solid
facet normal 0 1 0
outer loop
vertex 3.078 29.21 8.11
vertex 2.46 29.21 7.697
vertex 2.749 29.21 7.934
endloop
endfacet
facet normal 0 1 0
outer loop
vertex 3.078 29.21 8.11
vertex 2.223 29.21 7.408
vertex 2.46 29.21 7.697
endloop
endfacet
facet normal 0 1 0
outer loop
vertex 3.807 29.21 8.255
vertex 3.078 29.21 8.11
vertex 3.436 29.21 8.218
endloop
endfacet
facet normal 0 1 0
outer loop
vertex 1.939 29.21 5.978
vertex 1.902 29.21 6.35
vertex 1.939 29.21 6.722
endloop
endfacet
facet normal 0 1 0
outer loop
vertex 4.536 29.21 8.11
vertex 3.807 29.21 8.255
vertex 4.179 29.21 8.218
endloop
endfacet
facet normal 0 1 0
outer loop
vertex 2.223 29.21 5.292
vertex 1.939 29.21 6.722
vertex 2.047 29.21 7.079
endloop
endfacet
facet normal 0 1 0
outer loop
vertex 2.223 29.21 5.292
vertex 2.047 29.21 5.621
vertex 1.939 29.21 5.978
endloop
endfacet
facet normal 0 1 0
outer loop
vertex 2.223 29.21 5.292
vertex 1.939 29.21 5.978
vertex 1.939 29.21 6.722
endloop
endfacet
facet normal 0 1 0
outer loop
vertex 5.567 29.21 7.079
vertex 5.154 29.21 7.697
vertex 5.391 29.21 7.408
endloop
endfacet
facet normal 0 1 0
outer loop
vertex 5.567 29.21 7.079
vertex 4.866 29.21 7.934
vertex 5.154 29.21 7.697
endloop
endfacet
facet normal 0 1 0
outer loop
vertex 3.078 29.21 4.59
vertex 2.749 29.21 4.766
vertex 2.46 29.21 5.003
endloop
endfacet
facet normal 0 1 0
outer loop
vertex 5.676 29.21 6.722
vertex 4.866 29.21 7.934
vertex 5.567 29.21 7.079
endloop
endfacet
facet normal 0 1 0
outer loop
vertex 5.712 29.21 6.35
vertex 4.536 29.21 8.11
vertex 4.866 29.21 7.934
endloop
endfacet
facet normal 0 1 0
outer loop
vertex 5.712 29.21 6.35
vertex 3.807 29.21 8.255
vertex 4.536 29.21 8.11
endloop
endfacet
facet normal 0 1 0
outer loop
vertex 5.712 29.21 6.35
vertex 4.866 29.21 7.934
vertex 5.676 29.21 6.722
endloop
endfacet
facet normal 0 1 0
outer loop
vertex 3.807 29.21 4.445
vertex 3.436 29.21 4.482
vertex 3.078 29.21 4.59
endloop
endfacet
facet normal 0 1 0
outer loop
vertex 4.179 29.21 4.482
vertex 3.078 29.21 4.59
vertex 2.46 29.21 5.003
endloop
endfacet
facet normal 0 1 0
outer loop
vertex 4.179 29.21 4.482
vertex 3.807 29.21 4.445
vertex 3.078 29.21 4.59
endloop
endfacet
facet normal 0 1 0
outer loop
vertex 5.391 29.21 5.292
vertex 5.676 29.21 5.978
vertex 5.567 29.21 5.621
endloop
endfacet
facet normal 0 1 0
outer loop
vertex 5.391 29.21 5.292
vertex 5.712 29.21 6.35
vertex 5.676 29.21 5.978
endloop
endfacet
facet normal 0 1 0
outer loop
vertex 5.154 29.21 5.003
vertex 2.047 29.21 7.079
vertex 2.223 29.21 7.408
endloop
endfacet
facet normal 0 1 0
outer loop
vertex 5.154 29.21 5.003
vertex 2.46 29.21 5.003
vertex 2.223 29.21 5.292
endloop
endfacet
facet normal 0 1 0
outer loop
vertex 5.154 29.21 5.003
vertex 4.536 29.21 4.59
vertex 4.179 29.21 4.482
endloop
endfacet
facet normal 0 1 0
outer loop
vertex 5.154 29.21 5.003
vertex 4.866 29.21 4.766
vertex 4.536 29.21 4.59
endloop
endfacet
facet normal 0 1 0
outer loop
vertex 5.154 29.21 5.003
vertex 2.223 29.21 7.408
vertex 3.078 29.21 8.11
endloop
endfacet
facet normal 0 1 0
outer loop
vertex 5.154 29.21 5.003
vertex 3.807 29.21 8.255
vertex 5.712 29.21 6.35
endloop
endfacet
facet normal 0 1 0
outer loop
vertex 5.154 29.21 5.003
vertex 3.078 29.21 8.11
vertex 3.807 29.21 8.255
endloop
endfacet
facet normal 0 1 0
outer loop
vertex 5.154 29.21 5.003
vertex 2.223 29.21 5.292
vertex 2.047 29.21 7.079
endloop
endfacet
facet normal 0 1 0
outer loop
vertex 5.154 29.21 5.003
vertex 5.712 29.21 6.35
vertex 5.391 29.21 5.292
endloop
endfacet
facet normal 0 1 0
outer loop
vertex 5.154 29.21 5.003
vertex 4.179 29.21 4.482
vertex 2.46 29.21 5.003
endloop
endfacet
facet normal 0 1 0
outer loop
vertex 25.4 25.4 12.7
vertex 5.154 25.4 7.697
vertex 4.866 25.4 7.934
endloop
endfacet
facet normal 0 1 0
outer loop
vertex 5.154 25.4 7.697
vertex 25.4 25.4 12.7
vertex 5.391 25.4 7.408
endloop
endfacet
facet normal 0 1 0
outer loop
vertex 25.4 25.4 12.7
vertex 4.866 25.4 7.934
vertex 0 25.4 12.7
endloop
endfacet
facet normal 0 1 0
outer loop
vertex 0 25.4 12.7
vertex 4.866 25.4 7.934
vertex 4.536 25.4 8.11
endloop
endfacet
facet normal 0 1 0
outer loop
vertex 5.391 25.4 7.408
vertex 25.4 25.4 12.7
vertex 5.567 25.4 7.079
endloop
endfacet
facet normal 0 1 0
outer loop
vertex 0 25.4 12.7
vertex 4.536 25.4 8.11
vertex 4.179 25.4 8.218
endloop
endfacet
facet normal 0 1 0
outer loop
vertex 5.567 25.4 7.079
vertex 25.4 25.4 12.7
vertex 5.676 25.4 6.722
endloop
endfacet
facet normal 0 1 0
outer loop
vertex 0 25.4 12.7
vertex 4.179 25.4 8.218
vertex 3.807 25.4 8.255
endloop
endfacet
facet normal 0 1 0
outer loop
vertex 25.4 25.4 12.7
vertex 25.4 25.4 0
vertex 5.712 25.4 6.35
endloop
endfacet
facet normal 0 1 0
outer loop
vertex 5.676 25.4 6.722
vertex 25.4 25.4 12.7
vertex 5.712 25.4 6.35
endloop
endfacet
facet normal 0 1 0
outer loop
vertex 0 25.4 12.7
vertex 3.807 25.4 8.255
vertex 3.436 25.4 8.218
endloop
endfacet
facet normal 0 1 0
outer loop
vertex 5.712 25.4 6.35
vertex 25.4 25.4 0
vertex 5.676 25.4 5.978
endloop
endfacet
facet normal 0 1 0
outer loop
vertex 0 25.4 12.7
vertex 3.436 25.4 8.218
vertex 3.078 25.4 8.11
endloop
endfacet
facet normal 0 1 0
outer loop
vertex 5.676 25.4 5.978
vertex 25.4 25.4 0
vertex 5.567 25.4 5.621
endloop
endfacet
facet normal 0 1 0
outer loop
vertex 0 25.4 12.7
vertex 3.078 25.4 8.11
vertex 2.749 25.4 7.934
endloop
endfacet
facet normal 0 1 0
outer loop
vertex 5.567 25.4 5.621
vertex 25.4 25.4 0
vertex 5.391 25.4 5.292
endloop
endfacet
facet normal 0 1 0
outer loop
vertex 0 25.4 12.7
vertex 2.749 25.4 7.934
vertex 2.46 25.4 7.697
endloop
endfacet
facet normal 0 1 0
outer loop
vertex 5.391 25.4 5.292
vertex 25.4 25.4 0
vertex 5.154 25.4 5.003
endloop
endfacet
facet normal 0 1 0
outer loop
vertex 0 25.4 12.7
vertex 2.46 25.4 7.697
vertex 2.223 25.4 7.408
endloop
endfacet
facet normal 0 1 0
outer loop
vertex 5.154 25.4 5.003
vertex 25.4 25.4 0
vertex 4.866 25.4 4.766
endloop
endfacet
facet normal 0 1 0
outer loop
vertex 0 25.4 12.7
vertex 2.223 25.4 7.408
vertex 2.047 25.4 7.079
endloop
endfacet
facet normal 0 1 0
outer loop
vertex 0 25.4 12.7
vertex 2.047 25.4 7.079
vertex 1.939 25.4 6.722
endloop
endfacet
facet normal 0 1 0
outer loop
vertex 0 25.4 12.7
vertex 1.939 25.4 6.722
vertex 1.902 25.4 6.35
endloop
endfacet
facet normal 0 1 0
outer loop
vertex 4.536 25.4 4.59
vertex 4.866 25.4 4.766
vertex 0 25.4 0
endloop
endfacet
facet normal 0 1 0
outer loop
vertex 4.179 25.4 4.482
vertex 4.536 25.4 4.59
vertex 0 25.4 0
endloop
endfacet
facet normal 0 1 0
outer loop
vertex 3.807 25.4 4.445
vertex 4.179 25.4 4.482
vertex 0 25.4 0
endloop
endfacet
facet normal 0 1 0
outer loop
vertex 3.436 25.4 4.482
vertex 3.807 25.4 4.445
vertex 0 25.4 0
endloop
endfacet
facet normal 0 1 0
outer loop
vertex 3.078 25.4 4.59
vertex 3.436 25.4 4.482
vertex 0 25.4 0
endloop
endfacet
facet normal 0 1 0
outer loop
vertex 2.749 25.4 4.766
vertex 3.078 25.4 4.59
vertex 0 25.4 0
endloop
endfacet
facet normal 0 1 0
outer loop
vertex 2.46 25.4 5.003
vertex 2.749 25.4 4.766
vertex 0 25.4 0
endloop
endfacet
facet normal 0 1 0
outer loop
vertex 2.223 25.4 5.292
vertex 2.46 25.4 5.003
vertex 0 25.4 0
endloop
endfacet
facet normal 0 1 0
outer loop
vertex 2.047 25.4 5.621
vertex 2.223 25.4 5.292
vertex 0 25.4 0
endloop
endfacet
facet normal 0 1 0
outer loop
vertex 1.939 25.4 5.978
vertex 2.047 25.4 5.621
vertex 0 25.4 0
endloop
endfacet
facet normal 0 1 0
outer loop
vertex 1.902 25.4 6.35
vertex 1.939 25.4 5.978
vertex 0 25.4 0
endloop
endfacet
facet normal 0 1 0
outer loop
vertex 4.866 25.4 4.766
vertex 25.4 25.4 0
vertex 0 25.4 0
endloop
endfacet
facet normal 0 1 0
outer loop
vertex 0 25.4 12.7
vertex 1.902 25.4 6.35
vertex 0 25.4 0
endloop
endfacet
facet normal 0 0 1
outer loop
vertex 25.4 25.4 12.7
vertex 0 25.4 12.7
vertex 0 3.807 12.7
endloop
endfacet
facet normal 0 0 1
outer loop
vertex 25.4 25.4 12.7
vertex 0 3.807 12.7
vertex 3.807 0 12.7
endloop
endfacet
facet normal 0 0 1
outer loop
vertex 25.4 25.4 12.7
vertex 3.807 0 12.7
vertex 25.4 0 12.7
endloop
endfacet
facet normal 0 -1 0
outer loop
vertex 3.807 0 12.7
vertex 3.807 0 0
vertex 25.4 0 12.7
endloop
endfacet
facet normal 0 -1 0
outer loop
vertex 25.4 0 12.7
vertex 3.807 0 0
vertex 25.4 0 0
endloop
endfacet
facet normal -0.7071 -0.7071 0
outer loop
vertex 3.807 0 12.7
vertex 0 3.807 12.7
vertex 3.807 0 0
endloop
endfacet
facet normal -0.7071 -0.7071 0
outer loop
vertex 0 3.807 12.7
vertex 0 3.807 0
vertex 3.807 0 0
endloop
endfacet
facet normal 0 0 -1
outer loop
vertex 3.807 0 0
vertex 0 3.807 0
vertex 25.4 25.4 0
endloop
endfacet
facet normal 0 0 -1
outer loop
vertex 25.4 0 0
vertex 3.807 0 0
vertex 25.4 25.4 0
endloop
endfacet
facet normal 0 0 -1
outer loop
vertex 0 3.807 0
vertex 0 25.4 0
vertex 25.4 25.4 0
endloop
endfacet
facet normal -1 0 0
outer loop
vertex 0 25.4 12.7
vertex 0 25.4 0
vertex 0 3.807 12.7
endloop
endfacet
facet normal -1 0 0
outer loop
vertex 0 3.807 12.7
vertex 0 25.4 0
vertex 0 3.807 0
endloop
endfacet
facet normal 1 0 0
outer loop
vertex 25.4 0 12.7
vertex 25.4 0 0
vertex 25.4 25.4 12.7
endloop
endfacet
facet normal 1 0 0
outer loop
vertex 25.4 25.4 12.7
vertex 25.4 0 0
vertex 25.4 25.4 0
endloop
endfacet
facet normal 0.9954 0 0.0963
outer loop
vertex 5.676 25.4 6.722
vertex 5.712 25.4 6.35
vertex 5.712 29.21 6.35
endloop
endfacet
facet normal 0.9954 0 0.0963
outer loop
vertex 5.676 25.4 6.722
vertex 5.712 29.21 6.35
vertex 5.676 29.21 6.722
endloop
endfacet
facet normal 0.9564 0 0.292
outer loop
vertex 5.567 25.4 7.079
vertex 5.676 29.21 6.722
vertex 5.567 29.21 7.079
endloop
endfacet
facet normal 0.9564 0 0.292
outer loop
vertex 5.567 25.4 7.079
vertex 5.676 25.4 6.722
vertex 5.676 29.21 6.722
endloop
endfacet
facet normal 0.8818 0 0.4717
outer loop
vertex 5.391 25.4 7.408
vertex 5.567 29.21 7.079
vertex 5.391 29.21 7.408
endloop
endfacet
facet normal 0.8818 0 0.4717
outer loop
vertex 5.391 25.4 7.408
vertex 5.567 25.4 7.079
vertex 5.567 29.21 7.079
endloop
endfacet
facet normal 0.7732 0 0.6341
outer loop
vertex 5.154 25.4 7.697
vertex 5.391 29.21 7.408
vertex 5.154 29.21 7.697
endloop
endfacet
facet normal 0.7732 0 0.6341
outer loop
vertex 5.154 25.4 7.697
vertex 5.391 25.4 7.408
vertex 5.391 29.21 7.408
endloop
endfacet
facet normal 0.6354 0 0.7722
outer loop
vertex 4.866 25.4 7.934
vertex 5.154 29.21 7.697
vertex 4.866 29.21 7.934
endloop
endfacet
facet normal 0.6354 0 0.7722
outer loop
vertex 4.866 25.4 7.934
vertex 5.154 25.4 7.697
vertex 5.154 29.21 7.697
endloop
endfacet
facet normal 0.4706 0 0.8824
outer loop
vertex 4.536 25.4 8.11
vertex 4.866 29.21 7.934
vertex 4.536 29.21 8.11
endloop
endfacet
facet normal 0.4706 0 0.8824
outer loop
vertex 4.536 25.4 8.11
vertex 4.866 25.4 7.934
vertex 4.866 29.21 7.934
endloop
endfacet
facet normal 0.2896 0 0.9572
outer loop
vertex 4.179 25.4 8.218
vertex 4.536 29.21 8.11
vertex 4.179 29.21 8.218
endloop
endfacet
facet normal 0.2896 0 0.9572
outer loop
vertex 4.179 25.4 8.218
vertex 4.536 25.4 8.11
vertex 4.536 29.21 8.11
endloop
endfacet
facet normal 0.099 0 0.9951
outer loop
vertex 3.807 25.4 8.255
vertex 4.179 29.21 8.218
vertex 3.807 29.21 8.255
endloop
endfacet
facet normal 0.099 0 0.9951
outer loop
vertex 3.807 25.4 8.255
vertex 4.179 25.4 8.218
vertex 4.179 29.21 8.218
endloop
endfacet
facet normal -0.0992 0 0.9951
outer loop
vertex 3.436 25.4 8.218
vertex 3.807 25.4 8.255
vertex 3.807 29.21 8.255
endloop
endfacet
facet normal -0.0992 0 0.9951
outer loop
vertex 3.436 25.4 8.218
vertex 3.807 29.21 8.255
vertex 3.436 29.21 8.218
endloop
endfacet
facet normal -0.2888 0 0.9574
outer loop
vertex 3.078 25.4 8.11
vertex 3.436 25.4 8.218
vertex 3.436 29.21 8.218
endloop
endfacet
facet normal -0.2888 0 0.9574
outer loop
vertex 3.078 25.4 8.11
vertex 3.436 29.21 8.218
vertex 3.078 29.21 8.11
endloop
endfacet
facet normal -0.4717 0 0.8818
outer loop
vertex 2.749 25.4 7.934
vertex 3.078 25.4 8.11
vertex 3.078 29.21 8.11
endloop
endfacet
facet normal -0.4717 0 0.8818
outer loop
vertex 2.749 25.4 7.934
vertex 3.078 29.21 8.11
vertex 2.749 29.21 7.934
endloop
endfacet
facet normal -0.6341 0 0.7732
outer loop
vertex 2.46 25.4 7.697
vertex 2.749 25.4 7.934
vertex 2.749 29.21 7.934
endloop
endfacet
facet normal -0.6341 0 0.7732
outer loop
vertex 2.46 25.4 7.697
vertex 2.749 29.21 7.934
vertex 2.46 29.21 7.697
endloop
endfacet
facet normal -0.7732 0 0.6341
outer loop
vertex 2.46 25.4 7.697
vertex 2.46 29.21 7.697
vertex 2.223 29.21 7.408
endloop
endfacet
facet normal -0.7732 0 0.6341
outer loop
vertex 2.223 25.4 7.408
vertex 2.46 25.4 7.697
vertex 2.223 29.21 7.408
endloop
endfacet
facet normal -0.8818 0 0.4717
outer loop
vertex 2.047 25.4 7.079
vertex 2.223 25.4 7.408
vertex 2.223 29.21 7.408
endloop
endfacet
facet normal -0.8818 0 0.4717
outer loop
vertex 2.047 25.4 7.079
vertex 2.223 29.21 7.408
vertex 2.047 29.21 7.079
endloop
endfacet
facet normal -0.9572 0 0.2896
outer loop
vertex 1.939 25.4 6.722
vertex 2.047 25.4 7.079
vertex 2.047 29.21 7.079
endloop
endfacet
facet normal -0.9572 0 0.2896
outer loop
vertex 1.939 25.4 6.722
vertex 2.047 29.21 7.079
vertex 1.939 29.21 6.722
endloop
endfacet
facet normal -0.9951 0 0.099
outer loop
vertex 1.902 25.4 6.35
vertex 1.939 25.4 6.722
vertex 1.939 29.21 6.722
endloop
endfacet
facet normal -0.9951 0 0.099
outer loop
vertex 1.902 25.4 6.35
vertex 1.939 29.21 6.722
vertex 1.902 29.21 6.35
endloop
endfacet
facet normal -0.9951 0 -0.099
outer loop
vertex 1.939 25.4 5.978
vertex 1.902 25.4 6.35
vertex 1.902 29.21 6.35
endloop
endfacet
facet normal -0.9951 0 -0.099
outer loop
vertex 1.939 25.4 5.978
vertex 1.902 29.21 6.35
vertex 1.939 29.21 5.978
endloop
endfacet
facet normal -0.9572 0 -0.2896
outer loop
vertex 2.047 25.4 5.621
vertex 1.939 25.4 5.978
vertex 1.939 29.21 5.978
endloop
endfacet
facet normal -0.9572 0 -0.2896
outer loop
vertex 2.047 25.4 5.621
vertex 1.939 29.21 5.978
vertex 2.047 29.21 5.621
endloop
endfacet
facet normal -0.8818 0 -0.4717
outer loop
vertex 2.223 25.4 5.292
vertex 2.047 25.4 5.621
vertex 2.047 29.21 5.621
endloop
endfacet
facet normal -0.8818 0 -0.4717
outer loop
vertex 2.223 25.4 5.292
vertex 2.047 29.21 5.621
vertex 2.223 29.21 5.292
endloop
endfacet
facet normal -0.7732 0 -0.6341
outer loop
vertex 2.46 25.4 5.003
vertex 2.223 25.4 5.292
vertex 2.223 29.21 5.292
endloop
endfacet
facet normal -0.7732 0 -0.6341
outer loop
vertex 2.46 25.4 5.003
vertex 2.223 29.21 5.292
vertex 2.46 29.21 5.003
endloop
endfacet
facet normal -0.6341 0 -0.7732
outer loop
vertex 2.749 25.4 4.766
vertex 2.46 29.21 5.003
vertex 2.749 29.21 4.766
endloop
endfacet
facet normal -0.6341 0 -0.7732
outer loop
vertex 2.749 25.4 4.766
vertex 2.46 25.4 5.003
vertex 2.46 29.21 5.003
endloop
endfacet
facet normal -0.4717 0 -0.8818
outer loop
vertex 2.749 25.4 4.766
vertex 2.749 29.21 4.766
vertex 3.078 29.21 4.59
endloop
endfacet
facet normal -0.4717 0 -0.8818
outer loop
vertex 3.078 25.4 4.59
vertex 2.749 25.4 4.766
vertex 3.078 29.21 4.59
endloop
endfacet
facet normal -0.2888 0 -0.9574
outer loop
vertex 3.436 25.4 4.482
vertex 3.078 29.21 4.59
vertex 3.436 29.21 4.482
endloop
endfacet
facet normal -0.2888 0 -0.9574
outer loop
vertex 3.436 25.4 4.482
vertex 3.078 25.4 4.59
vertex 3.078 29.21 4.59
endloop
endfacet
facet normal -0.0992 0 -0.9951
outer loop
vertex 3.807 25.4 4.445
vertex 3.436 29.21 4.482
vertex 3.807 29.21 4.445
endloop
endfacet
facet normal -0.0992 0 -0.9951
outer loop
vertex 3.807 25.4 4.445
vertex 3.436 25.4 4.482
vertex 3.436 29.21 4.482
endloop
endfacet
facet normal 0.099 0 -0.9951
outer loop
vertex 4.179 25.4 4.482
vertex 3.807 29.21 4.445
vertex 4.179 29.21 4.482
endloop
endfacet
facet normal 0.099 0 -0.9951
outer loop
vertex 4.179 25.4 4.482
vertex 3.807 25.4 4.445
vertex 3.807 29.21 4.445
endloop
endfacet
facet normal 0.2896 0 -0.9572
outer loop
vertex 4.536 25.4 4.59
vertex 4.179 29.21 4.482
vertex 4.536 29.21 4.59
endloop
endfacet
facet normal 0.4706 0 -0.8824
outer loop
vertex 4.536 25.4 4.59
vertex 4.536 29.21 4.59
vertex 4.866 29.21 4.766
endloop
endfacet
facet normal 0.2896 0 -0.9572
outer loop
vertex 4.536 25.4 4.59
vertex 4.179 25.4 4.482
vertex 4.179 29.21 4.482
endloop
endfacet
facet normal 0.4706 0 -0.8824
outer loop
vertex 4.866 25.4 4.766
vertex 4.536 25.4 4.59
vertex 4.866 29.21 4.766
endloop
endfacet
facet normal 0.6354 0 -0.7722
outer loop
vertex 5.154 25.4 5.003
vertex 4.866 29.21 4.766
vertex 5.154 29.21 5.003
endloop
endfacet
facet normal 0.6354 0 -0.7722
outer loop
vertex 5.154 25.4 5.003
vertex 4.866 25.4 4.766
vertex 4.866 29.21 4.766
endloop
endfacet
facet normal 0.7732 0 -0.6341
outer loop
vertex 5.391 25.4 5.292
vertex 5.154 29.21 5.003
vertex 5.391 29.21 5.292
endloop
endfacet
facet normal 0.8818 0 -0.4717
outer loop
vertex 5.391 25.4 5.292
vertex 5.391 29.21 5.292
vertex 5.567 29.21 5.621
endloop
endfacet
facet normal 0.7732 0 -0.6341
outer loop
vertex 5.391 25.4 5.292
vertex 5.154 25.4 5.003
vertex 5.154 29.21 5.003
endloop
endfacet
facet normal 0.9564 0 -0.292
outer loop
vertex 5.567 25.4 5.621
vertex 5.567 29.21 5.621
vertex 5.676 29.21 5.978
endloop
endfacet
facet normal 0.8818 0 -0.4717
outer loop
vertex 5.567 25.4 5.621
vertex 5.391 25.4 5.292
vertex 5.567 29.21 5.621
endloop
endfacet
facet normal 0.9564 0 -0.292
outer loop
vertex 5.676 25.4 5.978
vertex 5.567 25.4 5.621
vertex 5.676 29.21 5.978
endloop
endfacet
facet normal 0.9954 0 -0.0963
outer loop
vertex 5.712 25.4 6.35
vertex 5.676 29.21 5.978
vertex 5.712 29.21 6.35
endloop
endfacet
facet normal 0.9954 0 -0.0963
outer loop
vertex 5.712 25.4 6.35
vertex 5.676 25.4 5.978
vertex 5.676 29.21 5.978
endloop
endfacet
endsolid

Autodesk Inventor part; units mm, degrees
ref_plane "YZ Plane" through (0, 0, 0) normal (1, 0, 0) x (0, 1, 0)
ref_plane "XZ Plane" through (0, 0, 0) normal (0, 1, 0) x (-1, 0, 0)
ref_plane "XY Plane" through (0, 0, 0) normal (0, 0, 1) x (1, 0, 0)
sketch "Sketch1" plane through (0, 0, 0) normal (0, 0, 1) x (1, 0, 0)
  line L0 (3.8073, 0) -> (25.4, 0)
  line L1 (25.4, 0) -> (25.4, 25.4)
  line L2 (25.4, 25.4) -> (0, 25.4)
  line L3 (0, 25.4) -> (0, 3.8073)
  line L4 (0, 3.8073) -> (3.8073, 0)
  line L5 (0, 3.8073) -> (5.3843, 3.8073) construction
  point P0 (0, 0)
  dimension "d2" = 25.4
  dimension "d3" = 25.4
  dimension "d4" = 45
extrude "Extrusion1" add sketch "Sketch1" along normal blind 12.7
sketch "Sketch2" plane through (0, 25.4, 0) normal (0, 1, 0) x (1, 0, 0)
  line L0 (25.4, 0) -> (0, 0) projected
  line L1 (0, 0) -> (0, -12.7) projected
  line L2 (25.4, -12.7) -> (0, -12.7) projected
  line L3 (25.4, 0) -> (25.4, -12.7) projected
  line L4 (3.8073, 0) -> (3.8073, -12.7) projected
  circle A0 centre (3.8073, -6.35) radius 1.905
  dimension "d7" = 3.81
extrude "Extrusion2" add sketch "Sketch2" along normal blind 3.81 contours A0 L4 | L4 A0
properties part number "Finger Servo"
